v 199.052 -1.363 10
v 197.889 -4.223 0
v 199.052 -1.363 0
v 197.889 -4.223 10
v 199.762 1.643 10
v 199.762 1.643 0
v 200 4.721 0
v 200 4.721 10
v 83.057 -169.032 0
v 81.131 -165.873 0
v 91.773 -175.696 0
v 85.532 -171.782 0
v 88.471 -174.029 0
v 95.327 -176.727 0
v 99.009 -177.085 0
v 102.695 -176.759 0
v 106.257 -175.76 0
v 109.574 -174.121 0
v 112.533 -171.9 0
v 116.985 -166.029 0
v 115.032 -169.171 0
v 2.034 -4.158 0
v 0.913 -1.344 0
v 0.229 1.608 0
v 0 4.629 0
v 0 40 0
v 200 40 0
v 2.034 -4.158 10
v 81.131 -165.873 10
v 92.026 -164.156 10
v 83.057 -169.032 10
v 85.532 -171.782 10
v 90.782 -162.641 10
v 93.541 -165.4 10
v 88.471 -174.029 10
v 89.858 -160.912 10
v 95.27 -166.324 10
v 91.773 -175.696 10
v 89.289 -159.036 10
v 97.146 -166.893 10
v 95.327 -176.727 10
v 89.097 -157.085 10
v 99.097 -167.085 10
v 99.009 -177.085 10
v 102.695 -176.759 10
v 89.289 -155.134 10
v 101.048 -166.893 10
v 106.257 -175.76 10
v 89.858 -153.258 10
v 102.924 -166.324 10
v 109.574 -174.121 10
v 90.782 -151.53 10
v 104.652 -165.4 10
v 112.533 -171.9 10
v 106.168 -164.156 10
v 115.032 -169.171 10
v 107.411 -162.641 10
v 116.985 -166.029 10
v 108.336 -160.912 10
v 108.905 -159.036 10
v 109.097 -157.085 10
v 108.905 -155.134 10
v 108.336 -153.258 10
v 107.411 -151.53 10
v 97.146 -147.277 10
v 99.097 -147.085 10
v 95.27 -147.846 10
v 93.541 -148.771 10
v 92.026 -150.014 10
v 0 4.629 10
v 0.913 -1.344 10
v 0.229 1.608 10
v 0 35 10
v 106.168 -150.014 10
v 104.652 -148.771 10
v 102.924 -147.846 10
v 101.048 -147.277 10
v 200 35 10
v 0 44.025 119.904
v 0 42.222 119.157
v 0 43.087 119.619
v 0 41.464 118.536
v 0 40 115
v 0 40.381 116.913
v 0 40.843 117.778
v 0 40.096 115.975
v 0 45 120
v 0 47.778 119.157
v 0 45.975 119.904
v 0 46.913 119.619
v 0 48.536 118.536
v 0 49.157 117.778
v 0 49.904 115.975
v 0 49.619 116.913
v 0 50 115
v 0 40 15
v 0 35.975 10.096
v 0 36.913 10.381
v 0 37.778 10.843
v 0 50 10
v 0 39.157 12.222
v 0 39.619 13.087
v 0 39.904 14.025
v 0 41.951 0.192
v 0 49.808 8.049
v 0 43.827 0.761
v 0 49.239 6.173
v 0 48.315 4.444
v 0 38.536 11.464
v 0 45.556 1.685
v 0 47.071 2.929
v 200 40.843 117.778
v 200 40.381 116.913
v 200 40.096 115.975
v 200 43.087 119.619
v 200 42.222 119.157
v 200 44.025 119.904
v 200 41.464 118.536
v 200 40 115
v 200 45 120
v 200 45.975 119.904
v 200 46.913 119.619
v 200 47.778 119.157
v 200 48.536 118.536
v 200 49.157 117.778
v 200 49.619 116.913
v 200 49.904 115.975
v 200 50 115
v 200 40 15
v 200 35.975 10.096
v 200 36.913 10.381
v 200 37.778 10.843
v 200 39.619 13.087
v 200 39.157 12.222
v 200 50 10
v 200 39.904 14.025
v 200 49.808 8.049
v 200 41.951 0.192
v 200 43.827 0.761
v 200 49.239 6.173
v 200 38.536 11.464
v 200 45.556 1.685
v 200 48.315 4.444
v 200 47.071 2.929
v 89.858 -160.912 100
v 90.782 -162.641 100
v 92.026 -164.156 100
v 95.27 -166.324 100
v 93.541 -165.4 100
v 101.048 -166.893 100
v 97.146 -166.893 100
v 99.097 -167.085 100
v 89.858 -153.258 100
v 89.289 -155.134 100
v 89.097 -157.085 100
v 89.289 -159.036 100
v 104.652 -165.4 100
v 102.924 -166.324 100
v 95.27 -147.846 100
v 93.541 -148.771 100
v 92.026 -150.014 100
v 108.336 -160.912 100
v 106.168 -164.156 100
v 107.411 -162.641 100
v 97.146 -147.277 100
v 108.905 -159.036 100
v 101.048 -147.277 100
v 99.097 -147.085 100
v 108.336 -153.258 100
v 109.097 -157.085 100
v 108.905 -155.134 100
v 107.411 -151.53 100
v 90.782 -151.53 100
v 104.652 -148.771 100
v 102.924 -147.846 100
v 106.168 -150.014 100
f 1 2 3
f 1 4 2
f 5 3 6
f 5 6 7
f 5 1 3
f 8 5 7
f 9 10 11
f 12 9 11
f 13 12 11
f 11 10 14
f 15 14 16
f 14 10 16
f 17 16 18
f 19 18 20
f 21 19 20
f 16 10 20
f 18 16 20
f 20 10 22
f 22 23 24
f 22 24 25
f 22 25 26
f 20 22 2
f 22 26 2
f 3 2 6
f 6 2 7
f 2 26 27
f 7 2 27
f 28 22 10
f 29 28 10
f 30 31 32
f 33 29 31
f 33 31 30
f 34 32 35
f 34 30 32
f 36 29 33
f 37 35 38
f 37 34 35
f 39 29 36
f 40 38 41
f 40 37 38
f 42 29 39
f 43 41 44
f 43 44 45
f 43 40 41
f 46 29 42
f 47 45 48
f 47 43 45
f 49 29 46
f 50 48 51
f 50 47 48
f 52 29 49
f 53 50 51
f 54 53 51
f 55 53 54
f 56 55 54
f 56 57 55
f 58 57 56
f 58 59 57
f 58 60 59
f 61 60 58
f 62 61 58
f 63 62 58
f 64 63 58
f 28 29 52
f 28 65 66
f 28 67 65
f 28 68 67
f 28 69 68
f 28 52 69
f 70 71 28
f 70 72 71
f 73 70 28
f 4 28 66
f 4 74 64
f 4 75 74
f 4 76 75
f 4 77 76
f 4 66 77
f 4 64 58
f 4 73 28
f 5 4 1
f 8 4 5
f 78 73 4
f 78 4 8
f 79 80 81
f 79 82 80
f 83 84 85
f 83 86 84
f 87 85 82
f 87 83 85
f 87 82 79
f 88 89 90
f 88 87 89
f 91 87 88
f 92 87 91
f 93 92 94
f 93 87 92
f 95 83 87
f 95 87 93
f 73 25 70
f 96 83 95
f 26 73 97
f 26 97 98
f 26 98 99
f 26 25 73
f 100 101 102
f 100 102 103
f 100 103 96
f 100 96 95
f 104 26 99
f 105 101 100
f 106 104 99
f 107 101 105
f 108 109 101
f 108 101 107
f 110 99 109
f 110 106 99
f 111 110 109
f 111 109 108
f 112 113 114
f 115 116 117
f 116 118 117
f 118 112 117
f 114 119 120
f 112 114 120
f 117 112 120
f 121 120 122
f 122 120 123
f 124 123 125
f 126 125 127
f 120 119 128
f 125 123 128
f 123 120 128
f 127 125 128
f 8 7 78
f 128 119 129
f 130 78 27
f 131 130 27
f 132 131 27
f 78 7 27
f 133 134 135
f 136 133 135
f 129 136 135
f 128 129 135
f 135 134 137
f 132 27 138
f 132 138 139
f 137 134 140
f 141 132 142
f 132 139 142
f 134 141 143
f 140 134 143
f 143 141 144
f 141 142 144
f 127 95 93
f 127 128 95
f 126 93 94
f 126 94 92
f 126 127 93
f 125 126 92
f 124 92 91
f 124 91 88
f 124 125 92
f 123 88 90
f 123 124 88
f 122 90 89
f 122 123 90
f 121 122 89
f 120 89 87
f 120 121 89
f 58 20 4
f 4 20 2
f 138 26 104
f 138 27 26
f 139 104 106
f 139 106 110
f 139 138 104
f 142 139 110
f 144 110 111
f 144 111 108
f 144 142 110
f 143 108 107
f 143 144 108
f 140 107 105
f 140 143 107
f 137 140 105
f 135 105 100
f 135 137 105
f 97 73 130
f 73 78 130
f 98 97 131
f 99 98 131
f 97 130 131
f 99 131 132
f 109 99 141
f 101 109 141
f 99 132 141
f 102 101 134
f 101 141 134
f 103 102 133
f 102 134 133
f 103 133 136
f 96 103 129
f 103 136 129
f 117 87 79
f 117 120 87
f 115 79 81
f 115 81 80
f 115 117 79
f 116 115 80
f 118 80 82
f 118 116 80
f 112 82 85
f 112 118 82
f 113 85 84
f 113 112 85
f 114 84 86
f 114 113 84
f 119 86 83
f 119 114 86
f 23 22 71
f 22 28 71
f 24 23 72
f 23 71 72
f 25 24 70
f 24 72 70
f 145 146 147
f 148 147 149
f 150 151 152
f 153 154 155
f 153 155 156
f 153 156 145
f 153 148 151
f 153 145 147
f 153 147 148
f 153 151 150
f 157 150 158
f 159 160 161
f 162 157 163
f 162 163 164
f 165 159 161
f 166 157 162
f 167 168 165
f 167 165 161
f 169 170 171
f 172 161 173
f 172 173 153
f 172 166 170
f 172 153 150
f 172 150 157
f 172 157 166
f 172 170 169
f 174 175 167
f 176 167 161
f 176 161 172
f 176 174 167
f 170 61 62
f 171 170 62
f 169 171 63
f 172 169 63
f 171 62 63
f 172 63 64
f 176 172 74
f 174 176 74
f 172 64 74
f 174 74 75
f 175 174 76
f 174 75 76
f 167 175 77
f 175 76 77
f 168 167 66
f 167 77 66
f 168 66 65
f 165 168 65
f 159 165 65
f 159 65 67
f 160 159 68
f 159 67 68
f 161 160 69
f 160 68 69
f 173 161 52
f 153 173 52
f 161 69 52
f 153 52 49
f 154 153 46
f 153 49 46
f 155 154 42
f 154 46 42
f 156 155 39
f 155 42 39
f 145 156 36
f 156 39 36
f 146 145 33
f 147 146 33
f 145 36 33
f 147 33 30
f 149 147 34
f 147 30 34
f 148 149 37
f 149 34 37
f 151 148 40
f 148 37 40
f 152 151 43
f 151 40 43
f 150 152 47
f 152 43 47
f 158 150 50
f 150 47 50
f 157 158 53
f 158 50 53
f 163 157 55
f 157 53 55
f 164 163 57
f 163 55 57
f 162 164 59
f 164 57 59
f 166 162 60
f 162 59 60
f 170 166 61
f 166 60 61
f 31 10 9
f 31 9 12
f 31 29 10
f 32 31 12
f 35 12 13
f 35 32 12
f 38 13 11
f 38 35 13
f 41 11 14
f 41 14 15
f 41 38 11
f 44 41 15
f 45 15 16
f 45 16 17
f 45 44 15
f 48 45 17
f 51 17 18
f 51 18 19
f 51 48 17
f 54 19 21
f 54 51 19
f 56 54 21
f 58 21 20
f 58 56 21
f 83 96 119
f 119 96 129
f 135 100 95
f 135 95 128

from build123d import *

# Parameters (mm, degrees)
F0_W     = 200
F0_H     = 50
F1_DEPTH = 10
F2_R     = 20
F3_R     = 10
F4_DEPTH = 90
F5_W     = 200
F5_H     = 10
F6_DEPTH = 110
F7_R     = 4.99999
F8_R     = 10


# Not quite as in the source:
# - a fillet or chamfer is up to 0.001 mm smaller than in the source, because OpenCascade refuses the exact size


with BuildPart() as f1:
    # F0 (on Top) → F1 (new body)
    with BuildSketch(Plane.XY):
        Polygon((200, 0), (0, 0), (98.8994031925, -202.201193615), align=None)
        with Locations((100, 25)):
            Rectangle(F0_W, F0_H)
    extrude(amount=F1_DEPTH)

    # F2
    f2_edges = [f1.edges().sort_by_distance(p)[0] for p in [
        (98.899403, -202.201194, 5),
        (200, 0, 5),
        (0, 0, 5),
    ]]
    fillet(f2_edges, radius=F2_R)

    # F3 (on face) → F4 (join)
    with BuildSketch(Plane.XY.offset(10)):
        with Locations((99.0967144561, -157.0852115379)):
            Circle(F3_R)
    extrude(amount=F4_DEPTH)

    # F5 (on face) → F6 (join)
    with BuildSketch(Plane.XY.offset(10)):
        with Locations((100, 45)):
            Rectangle(F5_W, F5_H)
    extrude(amount=F6_DEPTH)

    # F7 (radius 5 in the source; OpenCascade refuses exactly that, so slightly less here)
    f7_edges = [f1.edges().sort_by_distance(p)[0] for p in [
        (100, 50, 120),
        (100, 40, 120),
        (100, 40, 10),
    ]]
    fillet(f7_edges, radius=F7_R)

    # F8
    f8_edges = [f1.edges().sort_by_distance(p)[0] for p in [
        (100, 50, 0),
    ]]
    fillet(f8_edges, radius=F8_R)


solid = f1.part
